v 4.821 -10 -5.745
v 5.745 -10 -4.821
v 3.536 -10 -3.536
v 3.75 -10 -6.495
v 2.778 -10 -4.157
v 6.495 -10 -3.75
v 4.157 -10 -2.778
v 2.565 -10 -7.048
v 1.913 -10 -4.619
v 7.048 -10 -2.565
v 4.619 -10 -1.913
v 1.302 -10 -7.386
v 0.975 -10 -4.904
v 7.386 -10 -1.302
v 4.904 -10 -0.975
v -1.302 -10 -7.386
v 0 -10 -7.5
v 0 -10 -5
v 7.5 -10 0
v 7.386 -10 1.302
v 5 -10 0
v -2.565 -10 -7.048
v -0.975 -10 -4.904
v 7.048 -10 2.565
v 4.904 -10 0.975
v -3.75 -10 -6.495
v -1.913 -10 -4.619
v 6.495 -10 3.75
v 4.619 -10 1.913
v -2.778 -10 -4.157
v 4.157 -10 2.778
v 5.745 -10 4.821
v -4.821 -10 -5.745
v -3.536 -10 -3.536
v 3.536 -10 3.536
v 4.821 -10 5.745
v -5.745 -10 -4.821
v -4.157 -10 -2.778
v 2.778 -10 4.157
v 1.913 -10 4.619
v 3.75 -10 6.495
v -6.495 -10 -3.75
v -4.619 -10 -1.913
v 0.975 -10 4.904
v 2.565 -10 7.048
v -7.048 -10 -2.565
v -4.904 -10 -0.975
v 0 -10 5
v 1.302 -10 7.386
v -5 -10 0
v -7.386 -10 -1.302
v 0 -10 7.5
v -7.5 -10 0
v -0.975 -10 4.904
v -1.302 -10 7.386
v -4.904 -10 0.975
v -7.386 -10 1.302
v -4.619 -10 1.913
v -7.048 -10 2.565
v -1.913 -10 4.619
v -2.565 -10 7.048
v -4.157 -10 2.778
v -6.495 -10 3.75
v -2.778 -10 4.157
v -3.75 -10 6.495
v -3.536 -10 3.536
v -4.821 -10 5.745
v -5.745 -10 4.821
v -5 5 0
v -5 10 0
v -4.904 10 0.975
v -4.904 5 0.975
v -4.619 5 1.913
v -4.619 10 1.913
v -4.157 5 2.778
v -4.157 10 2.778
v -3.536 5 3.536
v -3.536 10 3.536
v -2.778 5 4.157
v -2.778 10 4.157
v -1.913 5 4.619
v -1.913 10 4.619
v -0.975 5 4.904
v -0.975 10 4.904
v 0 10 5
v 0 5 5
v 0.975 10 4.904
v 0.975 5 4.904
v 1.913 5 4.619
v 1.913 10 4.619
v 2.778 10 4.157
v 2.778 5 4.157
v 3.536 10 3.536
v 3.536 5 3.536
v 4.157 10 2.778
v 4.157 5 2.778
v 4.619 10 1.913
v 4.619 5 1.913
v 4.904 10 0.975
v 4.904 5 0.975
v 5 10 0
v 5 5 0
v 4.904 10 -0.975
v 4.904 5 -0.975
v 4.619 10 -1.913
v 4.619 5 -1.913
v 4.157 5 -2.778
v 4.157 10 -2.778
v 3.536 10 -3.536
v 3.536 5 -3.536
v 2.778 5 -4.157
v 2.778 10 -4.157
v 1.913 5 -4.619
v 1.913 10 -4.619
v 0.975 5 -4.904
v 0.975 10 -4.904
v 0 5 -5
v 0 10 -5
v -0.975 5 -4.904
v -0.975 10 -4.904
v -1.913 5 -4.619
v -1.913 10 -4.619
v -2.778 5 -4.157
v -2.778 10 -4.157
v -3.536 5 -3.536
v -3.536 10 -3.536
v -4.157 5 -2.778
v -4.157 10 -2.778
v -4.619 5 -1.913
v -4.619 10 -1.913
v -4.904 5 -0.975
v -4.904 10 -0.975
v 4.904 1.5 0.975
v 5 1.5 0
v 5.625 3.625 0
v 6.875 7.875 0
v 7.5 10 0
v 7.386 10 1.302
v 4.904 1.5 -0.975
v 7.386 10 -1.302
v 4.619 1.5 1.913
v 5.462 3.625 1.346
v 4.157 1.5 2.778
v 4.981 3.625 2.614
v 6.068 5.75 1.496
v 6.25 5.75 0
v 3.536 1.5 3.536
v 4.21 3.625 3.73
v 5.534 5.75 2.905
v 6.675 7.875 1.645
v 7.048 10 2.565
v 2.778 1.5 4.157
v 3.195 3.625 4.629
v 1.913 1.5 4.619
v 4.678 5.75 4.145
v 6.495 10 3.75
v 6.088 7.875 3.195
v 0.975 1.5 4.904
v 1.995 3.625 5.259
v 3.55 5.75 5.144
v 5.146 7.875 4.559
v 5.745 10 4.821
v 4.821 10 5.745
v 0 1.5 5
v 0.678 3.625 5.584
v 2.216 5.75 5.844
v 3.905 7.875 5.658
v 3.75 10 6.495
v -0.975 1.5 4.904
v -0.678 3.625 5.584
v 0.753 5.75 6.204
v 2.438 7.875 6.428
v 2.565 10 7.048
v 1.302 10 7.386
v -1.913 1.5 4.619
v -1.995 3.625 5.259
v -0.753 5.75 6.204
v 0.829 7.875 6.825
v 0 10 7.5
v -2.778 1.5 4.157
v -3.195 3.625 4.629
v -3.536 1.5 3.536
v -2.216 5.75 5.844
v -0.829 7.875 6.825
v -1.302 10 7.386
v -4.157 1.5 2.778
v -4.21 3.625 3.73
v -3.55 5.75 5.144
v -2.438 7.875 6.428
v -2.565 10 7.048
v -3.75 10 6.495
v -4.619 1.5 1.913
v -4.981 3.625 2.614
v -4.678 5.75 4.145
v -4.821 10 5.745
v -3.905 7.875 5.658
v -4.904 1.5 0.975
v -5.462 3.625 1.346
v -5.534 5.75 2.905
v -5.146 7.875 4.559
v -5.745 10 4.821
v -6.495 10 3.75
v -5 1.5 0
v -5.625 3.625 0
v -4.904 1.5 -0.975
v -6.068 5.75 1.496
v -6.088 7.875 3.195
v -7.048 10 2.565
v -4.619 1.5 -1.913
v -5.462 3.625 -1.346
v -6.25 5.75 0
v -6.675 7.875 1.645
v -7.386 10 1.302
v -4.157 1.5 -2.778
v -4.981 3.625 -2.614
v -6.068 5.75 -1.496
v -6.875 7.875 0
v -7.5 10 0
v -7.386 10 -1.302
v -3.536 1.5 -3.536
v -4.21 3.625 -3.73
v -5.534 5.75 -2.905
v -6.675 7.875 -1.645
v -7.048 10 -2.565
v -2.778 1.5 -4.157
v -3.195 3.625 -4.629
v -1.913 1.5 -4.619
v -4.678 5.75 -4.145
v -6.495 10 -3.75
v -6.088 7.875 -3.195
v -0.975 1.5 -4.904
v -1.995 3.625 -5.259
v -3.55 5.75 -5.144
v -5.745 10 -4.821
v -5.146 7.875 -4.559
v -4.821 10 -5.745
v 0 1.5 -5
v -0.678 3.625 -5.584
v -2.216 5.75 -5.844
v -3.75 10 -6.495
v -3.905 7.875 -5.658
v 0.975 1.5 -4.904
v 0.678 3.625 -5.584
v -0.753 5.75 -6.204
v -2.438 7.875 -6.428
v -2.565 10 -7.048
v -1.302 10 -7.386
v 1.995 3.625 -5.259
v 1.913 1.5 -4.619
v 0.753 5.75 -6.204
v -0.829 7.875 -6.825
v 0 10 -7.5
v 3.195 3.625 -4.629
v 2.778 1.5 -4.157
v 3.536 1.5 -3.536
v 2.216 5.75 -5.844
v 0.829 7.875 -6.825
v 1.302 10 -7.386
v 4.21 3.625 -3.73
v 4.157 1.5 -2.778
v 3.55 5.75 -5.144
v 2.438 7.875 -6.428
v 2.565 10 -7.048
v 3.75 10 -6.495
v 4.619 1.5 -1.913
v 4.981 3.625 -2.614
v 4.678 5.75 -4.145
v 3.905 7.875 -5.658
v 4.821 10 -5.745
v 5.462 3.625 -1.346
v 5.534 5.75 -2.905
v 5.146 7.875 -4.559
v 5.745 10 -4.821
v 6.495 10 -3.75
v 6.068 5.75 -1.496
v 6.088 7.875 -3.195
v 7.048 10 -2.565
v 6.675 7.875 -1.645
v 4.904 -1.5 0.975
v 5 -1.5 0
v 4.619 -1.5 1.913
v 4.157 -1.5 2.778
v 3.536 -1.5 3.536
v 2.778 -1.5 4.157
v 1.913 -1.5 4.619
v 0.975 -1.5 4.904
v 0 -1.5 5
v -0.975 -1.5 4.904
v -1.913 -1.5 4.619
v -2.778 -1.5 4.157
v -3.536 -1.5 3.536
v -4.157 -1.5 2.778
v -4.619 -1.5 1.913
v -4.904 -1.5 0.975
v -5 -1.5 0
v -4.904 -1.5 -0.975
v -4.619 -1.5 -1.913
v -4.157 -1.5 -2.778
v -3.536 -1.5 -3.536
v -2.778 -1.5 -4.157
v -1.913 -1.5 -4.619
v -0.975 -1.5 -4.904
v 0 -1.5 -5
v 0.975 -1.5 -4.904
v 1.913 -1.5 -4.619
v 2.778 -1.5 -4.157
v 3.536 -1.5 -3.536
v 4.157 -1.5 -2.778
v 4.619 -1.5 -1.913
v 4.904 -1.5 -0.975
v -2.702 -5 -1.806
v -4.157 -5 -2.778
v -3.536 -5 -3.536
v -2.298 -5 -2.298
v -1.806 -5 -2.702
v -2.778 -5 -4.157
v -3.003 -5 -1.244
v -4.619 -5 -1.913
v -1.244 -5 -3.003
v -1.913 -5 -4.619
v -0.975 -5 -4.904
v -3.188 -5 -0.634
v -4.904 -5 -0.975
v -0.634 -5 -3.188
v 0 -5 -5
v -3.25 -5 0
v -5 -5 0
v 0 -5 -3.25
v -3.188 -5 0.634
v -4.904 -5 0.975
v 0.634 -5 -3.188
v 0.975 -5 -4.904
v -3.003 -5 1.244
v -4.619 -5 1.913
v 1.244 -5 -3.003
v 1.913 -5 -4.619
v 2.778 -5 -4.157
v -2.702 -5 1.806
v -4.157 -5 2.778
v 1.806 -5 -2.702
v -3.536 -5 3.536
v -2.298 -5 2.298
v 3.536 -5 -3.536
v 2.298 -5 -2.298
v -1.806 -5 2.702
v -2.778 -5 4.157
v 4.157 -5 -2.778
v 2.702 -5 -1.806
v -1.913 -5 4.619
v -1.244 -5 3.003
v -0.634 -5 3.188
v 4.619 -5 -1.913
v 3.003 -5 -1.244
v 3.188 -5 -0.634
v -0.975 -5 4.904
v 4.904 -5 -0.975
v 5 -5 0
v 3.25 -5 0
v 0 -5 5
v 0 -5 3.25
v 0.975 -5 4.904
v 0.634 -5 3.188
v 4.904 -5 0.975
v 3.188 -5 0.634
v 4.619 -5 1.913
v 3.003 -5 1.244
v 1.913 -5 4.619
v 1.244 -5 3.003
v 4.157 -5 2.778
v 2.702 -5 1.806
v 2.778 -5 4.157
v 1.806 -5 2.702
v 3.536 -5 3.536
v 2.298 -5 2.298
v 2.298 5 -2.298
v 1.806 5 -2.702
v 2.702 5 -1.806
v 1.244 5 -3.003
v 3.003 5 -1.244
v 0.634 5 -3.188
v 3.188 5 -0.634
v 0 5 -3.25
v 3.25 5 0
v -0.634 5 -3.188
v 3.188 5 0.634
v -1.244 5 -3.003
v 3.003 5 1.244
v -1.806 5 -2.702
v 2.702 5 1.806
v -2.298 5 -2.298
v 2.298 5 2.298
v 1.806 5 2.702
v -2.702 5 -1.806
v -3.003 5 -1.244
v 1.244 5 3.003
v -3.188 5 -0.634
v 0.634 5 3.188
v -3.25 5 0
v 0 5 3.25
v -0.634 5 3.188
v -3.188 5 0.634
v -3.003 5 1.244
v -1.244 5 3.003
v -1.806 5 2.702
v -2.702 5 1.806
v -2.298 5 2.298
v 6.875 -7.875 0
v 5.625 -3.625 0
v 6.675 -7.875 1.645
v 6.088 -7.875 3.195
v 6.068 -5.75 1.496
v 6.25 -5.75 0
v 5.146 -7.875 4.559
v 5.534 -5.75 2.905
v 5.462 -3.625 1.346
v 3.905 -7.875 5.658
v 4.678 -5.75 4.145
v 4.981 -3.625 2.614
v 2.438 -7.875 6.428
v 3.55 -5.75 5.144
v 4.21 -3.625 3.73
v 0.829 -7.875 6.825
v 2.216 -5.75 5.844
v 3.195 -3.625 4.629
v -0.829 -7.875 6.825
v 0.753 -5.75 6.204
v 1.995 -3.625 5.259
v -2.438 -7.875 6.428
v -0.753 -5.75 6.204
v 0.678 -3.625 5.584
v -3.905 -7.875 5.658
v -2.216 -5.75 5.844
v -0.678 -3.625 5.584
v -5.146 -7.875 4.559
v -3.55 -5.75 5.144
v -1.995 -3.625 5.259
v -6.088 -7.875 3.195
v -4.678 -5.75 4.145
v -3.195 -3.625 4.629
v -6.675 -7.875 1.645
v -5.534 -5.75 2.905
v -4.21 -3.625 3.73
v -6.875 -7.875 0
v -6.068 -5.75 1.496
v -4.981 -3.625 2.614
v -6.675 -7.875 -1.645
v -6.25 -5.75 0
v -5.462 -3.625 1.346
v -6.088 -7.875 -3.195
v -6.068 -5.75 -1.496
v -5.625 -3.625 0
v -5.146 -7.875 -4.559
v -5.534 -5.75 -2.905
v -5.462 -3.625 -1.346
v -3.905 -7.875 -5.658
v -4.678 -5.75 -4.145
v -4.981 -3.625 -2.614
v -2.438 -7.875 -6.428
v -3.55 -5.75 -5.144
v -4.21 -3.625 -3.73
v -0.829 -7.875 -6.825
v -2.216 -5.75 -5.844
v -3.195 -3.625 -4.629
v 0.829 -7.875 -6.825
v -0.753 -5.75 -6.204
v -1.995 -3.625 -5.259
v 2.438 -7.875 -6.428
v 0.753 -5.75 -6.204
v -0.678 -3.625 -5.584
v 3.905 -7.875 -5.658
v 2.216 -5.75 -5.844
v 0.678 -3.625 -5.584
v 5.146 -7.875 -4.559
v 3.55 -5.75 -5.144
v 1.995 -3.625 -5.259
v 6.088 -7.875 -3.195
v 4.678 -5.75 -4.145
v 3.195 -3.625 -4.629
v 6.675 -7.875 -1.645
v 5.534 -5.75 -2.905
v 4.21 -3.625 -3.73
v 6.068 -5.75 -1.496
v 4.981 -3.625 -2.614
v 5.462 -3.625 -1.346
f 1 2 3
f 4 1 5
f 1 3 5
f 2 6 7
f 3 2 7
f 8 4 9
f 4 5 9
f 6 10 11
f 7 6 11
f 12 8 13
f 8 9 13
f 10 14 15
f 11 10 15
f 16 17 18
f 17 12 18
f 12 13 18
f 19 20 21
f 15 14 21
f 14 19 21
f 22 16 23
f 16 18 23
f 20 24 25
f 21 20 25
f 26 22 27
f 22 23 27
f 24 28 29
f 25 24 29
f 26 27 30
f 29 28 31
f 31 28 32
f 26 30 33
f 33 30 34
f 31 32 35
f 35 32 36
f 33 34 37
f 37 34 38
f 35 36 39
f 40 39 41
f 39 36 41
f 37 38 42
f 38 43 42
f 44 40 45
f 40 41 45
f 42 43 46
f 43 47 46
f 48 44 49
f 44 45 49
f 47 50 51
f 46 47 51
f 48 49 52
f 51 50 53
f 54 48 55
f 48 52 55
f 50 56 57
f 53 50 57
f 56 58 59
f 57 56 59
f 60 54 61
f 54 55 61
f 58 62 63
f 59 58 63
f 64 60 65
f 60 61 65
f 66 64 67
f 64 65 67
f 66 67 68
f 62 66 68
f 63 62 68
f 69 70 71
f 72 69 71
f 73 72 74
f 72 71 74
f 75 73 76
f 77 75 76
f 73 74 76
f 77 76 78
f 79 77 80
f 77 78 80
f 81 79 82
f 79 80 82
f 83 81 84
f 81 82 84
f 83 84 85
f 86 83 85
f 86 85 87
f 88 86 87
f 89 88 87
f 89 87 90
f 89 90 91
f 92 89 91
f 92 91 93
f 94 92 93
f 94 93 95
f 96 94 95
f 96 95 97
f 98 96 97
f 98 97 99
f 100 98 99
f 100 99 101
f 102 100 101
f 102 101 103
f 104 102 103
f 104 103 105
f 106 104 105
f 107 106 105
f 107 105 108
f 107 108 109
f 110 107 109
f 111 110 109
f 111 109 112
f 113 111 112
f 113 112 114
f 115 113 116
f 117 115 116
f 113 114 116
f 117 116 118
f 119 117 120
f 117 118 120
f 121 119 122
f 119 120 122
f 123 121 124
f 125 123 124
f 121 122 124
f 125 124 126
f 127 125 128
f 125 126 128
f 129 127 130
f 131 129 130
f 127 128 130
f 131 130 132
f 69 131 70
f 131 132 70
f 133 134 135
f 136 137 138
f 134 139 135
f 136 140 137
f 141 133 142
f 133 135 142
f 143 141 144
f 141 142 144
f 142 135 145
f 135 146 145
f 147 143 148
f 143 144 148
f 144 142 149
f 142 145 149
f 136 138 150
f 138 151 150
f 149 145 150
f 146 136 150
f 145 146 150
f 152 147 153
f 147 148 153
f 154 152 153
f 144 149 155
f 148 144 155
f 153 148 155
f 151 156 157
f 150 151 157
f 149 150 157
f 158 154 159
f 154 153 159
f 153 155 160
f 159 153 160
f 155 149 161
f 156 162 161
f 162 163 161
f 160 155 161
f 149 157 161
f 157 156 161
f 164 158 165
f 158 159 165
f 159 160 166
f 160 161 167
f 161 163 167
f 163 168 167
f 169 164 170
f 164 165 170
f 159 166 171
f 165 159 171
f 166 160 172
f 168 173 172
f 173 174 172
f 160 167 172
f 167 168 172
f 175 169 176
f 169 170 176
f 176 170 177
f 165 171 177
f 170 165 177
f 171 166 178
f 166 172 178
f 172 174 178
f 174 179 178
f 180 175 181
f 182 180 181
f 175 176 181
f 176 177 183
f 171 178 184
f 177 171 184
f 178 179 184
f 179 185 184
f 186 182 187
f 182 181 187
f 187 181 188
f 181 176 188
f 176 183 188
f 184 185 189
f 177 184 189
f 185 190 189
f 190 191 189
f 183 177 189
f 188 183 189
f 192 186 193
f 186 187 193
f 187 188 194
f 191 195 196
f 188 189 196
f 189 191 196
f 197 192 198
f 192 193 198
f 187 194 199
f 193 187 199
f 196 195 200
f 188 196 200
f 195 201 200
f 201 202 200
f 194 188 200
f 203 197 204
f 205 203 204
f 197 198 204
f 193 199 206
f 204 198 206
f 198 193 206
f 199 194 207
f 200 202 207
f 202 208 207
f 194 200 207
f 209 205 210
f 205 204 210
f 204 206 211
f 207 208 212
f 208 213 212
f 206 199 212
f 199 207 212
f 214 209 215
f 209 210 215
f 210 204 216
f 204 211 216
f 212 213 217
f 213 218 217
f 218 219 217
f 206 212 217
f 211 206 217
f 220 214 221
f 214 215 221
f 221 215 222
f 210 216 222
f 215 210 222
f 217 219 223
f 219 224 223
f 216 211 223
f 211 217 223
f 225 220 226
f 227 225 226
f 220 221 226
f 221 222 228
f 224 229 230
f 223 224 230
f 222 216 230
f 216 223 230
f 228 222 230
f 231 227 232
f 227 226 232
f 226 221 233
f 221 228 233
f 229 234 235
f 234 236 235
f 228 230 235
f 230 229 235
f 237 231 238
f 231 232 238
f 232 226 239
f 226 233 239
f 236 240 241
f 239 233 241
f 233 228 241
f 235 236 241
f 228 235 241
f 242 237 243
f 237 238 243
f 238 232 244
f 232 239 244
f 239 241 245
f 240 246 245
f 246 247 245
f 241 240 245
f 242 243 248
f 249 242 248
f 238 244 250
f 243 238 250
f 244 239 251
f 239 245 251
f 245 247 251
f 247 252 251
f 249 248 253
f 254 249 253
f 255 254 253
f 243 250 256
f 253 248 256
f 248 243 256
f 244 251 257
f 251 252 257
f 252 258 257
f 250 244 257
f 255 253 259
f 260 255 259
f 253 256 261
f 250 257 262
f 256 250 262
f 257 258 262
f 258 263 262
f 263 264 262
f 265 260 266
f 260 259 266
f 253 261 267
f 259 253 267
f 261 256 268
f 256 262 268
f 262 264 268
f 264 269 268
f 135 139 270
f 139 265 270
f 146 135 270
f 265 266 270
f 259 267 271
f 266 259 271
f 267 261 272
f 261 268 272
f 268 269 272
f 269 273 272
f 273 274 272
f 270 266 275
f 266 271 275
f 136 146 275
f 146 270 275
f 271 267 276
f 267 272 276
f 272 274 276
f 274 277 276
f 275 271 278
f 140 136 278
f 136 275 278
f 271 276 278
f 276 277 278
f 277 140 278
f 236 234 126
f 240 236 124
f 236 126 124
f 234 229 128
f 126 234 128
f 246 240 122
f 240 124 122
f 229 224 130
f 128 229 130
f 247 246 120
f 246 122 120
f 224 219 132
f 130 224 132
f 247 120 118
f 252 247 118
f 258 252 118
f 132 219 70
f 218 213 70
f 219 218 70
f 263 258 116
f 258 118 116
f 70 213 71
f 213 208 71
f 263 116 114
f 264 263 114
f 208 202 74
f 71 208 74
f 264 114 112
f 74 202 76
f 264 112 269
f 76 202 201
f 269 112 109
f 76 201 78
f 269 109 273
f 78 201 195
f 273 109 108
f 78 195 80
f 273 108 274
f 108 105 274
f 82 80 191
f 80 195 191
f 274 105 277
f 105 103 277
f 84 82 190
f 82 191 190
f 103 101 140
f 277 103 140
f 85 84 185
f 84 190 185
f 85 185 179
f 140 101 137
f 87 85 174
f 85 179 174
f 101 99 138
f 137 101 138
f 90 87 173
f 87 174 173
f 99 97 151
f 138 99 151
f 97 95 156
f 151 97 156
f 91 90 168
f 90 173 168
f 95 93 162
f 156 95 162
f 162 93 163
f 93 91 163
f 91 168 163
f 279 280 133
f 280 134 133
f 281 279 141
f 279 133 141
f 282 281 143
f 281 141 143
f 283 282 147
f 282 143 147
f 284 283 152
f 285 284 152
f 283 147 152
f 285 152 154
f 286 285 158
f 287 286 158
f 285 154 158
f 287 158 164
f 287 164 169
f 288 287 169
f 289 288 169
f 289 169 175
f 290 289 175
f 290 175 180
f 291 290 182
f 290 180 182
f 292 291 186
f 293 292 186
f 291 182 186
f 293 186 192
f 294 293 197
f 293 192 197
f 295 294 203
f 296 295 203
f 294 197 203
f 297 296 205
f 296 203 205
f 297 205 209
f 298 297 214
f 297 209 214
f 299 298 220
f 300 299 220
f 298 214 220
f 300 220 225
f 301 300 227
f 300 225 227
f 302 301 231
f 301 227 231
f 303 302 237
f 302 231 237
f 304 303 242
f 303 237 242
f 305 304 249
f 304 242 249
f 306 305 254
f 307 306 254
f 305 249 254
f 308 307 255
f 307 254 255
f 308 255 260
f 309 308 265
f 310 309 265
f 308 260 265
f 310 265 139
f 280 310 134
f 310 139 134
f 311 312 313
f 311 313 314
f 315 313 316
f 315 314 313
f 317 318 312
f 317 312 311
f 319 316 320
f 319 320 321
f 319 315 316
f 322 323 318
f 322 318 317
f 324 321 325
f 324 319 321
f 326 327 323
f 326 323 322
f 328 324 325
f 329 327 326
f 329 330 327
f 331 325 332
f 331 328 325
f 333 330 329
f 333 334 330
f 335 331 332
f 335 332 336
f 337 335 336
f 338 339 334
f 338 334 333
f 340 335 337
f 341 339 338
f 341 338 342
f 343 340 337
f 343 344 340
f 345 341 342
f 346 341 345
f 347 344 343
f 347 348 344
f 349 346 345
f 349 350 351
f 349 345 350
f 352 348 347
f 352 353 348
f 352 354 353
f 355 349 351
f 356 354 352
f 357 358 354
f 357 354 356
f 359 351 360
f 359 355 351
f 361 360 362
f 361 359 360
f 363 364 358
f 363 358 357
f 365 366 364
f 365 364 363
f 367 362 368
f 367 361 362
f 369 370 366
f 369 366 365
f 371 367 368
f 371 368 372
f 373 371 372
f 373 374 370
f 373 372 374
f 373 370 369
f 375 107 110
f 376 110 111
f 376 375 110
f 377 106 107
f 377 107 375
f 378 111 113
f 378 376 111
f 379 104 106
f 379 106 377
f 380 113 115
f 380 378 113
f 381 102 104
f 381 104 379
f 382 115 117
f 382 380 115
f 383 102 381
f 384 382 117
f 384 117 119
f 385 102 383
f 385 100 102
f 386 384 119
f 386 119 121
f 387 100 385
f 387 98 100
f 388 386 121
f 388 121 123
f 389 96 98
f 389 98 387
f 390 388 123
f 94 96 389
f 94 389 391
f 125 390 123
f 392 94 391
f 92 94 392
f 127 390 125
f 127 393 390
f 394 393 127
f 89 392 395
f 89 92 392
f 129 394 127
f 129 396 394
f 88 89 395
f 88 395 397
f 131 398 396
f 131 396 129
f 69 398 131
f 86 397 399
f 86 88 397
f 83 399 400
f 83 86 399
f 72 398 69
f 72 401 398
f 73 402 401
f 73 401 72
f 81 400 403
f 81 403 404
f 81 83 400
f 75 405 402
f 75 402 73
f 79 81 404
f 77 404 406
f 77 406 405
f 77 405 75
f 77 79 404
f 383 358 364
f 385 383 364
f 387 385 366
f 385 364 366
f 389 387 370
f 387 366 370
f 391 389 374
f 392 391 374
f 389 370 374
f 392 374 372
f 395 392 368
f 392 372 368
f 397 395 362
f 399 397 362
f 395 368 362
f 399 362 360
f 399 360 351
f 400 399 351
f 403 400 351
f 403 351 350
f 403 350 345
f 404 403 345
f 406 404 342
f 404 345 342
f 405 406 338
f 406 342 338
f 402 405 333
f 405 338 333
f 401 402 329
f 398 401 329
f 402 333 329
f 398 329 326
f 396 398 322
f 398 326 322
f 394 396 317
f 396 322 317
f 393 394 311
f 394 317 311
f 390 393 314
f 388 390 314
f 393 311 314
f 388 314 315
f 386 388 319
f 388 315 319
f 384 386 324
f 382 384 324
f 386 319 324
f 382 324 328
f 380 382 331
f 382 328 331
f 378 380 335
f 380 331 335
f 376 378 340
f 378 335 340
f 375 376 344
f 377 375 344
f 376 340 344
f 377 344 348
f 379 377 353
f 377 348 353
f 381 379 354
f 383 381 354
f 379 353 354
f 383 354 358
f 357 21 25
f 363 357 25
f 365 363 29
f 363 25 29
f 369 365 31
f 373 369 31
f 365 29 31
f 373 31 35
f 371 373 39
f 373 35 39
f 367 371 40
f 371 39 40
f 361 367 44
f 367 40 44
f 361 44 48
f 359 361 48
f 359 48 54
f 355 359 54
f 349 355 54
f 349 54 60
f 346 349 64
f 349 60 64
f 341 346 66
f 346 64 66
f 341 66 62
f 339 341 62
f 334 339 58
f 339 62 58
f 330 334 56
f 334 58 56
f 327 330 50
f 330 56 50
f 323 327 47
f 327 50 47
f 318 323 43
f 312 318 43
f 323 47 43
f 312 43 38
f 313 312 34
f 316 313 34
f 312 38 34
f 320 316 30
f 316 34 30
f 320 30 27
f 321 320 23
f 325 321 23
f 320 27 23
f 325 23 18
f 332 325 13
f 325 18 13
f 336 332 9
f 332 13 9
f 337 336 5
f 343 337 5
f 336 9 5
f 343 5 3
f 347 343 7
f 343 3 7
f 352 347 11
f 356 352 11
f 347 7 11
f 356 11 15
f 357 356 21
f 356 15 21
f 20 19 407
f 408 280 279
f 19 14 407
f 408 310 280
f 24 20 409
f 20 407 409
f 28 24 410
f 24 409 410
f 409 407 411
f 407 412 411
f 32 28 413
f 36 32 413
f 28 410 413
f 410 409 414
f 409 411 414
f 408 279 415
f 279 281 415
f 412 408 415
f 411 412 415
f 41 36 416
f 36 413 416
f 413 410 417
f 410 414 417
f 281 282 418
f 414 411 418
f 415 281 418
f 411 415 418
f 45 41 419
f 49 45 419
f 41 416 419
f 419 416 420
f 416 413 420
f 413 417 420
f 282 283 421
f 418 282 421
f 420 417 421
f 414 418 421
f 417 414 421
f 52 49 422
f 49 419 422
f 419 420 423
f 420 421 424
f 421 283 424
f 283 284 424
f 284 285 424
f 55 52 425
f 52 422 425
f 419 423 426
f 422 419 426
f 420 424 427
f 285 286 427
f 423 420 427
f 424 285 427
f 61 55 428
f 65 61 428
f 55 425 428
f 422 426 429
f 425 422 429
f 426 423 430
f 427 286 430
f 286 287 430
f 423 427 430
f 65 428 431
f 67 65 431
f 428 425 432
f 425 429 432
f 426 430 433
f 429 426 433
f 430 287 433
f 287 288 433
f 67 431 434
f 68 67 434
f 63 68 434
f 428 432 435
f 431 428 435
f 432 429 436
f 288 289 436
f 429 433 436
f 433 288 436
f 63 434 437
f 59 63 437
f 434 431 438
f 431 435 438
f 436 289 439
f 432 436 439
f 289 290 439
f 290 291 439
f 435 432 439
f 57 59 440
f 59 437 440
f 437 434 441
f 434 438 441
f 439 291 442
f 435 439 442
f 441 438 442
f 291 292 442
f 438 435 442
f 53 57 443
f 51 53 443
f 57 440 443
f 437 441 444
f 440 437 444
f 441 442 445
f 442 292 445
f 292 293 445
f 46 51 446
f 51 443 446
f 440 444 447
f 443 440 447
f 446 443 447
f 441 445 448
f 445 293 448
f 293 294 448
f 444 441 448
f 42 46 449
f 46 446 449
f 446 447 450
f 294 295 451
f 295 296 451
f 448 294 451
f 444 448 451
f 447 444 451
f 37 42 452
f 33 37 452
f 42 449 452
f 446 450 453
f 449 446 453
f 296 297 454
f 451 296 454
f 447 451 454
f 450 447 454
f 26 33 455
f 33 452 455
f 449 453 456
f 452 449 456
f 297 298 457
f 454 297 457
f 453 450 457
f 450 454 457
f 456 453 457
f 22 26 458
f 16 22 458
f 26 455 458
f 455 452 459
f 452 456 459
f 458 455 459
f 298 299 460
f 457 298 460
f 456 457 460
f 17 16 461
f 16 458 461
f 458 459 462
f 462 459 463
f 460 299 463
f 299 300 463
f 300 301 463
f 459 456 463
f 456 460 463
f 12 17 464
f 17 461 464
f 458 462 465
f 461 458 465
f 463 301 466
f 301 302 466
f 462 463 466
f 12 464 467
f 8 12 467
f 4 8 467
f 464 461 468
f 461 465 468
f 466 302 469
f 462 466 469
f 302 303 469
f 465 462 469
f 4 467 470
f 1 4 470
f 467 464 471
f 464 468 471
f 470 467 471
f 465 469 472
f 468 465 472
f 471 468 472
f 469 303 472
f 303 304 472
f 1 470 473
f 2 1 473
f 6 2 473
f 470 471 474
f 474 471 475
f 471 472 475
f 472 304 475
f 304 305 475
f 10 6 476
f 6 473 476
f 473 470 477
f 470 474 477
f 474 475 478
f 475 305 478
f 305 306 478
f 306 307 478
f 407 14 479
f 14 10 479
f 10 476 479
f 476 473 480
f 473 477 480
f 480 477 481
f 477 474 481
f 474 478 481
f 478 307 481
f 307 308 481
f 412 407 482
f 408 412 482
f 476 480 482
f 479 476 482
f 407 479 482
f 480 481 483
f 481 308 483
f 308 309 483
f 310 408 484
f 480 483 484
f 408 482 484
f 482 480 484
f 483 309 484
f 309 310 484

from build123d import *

# Parameters (mm, degrees)
F0_W           = 5
F0_H           = 3
F3_D           = 6.5
F3_CBORE_D     = 10
F3_CBORE_DEPTH = 5
F4_R           = 5
F4_R_2         = 3.25
F5_DEPTH       = 5


with BuildPart() as f1:
    # F0 (on Top) → F1 (revolve)
    with BuildSketch(Plane.XY):
        Polygon((0, 1.5), (5, 1.5), (7.5, 10), (0, 10), align=None)
        Polygon((0, -10), (7.5, -10), (5, -1.5), (0, -1.5), align=None)
        with Locations((2.5, 0)):
            Rectangle(F0_W, F0_H)
    revolve(axis=Axis((0, 0, 0), (0, -1, 0)))

    # F3 (through all)
    with Locations(Plane(origin=(0, 10, 0), x_dir=(-1, 0, 0), z_dir=(0, 1, 0))):
        with Locations((0, 0)):
            CounterBoreHole(F3_D / 2, F3_CBORE_D / 2, F3_CBORE_DEPTH)

    # F4 (on face) → F5 (cut)
    with BuildSketch(Plane.XZ.offset(10)):
        Circle(F4_R)
        Circle(F4_R_2, mode=Mode.SUBTRACT)
    extrude(amount=-F5_DEPTH, mode=Mode.SUBTRACT)


solid = f1.part
